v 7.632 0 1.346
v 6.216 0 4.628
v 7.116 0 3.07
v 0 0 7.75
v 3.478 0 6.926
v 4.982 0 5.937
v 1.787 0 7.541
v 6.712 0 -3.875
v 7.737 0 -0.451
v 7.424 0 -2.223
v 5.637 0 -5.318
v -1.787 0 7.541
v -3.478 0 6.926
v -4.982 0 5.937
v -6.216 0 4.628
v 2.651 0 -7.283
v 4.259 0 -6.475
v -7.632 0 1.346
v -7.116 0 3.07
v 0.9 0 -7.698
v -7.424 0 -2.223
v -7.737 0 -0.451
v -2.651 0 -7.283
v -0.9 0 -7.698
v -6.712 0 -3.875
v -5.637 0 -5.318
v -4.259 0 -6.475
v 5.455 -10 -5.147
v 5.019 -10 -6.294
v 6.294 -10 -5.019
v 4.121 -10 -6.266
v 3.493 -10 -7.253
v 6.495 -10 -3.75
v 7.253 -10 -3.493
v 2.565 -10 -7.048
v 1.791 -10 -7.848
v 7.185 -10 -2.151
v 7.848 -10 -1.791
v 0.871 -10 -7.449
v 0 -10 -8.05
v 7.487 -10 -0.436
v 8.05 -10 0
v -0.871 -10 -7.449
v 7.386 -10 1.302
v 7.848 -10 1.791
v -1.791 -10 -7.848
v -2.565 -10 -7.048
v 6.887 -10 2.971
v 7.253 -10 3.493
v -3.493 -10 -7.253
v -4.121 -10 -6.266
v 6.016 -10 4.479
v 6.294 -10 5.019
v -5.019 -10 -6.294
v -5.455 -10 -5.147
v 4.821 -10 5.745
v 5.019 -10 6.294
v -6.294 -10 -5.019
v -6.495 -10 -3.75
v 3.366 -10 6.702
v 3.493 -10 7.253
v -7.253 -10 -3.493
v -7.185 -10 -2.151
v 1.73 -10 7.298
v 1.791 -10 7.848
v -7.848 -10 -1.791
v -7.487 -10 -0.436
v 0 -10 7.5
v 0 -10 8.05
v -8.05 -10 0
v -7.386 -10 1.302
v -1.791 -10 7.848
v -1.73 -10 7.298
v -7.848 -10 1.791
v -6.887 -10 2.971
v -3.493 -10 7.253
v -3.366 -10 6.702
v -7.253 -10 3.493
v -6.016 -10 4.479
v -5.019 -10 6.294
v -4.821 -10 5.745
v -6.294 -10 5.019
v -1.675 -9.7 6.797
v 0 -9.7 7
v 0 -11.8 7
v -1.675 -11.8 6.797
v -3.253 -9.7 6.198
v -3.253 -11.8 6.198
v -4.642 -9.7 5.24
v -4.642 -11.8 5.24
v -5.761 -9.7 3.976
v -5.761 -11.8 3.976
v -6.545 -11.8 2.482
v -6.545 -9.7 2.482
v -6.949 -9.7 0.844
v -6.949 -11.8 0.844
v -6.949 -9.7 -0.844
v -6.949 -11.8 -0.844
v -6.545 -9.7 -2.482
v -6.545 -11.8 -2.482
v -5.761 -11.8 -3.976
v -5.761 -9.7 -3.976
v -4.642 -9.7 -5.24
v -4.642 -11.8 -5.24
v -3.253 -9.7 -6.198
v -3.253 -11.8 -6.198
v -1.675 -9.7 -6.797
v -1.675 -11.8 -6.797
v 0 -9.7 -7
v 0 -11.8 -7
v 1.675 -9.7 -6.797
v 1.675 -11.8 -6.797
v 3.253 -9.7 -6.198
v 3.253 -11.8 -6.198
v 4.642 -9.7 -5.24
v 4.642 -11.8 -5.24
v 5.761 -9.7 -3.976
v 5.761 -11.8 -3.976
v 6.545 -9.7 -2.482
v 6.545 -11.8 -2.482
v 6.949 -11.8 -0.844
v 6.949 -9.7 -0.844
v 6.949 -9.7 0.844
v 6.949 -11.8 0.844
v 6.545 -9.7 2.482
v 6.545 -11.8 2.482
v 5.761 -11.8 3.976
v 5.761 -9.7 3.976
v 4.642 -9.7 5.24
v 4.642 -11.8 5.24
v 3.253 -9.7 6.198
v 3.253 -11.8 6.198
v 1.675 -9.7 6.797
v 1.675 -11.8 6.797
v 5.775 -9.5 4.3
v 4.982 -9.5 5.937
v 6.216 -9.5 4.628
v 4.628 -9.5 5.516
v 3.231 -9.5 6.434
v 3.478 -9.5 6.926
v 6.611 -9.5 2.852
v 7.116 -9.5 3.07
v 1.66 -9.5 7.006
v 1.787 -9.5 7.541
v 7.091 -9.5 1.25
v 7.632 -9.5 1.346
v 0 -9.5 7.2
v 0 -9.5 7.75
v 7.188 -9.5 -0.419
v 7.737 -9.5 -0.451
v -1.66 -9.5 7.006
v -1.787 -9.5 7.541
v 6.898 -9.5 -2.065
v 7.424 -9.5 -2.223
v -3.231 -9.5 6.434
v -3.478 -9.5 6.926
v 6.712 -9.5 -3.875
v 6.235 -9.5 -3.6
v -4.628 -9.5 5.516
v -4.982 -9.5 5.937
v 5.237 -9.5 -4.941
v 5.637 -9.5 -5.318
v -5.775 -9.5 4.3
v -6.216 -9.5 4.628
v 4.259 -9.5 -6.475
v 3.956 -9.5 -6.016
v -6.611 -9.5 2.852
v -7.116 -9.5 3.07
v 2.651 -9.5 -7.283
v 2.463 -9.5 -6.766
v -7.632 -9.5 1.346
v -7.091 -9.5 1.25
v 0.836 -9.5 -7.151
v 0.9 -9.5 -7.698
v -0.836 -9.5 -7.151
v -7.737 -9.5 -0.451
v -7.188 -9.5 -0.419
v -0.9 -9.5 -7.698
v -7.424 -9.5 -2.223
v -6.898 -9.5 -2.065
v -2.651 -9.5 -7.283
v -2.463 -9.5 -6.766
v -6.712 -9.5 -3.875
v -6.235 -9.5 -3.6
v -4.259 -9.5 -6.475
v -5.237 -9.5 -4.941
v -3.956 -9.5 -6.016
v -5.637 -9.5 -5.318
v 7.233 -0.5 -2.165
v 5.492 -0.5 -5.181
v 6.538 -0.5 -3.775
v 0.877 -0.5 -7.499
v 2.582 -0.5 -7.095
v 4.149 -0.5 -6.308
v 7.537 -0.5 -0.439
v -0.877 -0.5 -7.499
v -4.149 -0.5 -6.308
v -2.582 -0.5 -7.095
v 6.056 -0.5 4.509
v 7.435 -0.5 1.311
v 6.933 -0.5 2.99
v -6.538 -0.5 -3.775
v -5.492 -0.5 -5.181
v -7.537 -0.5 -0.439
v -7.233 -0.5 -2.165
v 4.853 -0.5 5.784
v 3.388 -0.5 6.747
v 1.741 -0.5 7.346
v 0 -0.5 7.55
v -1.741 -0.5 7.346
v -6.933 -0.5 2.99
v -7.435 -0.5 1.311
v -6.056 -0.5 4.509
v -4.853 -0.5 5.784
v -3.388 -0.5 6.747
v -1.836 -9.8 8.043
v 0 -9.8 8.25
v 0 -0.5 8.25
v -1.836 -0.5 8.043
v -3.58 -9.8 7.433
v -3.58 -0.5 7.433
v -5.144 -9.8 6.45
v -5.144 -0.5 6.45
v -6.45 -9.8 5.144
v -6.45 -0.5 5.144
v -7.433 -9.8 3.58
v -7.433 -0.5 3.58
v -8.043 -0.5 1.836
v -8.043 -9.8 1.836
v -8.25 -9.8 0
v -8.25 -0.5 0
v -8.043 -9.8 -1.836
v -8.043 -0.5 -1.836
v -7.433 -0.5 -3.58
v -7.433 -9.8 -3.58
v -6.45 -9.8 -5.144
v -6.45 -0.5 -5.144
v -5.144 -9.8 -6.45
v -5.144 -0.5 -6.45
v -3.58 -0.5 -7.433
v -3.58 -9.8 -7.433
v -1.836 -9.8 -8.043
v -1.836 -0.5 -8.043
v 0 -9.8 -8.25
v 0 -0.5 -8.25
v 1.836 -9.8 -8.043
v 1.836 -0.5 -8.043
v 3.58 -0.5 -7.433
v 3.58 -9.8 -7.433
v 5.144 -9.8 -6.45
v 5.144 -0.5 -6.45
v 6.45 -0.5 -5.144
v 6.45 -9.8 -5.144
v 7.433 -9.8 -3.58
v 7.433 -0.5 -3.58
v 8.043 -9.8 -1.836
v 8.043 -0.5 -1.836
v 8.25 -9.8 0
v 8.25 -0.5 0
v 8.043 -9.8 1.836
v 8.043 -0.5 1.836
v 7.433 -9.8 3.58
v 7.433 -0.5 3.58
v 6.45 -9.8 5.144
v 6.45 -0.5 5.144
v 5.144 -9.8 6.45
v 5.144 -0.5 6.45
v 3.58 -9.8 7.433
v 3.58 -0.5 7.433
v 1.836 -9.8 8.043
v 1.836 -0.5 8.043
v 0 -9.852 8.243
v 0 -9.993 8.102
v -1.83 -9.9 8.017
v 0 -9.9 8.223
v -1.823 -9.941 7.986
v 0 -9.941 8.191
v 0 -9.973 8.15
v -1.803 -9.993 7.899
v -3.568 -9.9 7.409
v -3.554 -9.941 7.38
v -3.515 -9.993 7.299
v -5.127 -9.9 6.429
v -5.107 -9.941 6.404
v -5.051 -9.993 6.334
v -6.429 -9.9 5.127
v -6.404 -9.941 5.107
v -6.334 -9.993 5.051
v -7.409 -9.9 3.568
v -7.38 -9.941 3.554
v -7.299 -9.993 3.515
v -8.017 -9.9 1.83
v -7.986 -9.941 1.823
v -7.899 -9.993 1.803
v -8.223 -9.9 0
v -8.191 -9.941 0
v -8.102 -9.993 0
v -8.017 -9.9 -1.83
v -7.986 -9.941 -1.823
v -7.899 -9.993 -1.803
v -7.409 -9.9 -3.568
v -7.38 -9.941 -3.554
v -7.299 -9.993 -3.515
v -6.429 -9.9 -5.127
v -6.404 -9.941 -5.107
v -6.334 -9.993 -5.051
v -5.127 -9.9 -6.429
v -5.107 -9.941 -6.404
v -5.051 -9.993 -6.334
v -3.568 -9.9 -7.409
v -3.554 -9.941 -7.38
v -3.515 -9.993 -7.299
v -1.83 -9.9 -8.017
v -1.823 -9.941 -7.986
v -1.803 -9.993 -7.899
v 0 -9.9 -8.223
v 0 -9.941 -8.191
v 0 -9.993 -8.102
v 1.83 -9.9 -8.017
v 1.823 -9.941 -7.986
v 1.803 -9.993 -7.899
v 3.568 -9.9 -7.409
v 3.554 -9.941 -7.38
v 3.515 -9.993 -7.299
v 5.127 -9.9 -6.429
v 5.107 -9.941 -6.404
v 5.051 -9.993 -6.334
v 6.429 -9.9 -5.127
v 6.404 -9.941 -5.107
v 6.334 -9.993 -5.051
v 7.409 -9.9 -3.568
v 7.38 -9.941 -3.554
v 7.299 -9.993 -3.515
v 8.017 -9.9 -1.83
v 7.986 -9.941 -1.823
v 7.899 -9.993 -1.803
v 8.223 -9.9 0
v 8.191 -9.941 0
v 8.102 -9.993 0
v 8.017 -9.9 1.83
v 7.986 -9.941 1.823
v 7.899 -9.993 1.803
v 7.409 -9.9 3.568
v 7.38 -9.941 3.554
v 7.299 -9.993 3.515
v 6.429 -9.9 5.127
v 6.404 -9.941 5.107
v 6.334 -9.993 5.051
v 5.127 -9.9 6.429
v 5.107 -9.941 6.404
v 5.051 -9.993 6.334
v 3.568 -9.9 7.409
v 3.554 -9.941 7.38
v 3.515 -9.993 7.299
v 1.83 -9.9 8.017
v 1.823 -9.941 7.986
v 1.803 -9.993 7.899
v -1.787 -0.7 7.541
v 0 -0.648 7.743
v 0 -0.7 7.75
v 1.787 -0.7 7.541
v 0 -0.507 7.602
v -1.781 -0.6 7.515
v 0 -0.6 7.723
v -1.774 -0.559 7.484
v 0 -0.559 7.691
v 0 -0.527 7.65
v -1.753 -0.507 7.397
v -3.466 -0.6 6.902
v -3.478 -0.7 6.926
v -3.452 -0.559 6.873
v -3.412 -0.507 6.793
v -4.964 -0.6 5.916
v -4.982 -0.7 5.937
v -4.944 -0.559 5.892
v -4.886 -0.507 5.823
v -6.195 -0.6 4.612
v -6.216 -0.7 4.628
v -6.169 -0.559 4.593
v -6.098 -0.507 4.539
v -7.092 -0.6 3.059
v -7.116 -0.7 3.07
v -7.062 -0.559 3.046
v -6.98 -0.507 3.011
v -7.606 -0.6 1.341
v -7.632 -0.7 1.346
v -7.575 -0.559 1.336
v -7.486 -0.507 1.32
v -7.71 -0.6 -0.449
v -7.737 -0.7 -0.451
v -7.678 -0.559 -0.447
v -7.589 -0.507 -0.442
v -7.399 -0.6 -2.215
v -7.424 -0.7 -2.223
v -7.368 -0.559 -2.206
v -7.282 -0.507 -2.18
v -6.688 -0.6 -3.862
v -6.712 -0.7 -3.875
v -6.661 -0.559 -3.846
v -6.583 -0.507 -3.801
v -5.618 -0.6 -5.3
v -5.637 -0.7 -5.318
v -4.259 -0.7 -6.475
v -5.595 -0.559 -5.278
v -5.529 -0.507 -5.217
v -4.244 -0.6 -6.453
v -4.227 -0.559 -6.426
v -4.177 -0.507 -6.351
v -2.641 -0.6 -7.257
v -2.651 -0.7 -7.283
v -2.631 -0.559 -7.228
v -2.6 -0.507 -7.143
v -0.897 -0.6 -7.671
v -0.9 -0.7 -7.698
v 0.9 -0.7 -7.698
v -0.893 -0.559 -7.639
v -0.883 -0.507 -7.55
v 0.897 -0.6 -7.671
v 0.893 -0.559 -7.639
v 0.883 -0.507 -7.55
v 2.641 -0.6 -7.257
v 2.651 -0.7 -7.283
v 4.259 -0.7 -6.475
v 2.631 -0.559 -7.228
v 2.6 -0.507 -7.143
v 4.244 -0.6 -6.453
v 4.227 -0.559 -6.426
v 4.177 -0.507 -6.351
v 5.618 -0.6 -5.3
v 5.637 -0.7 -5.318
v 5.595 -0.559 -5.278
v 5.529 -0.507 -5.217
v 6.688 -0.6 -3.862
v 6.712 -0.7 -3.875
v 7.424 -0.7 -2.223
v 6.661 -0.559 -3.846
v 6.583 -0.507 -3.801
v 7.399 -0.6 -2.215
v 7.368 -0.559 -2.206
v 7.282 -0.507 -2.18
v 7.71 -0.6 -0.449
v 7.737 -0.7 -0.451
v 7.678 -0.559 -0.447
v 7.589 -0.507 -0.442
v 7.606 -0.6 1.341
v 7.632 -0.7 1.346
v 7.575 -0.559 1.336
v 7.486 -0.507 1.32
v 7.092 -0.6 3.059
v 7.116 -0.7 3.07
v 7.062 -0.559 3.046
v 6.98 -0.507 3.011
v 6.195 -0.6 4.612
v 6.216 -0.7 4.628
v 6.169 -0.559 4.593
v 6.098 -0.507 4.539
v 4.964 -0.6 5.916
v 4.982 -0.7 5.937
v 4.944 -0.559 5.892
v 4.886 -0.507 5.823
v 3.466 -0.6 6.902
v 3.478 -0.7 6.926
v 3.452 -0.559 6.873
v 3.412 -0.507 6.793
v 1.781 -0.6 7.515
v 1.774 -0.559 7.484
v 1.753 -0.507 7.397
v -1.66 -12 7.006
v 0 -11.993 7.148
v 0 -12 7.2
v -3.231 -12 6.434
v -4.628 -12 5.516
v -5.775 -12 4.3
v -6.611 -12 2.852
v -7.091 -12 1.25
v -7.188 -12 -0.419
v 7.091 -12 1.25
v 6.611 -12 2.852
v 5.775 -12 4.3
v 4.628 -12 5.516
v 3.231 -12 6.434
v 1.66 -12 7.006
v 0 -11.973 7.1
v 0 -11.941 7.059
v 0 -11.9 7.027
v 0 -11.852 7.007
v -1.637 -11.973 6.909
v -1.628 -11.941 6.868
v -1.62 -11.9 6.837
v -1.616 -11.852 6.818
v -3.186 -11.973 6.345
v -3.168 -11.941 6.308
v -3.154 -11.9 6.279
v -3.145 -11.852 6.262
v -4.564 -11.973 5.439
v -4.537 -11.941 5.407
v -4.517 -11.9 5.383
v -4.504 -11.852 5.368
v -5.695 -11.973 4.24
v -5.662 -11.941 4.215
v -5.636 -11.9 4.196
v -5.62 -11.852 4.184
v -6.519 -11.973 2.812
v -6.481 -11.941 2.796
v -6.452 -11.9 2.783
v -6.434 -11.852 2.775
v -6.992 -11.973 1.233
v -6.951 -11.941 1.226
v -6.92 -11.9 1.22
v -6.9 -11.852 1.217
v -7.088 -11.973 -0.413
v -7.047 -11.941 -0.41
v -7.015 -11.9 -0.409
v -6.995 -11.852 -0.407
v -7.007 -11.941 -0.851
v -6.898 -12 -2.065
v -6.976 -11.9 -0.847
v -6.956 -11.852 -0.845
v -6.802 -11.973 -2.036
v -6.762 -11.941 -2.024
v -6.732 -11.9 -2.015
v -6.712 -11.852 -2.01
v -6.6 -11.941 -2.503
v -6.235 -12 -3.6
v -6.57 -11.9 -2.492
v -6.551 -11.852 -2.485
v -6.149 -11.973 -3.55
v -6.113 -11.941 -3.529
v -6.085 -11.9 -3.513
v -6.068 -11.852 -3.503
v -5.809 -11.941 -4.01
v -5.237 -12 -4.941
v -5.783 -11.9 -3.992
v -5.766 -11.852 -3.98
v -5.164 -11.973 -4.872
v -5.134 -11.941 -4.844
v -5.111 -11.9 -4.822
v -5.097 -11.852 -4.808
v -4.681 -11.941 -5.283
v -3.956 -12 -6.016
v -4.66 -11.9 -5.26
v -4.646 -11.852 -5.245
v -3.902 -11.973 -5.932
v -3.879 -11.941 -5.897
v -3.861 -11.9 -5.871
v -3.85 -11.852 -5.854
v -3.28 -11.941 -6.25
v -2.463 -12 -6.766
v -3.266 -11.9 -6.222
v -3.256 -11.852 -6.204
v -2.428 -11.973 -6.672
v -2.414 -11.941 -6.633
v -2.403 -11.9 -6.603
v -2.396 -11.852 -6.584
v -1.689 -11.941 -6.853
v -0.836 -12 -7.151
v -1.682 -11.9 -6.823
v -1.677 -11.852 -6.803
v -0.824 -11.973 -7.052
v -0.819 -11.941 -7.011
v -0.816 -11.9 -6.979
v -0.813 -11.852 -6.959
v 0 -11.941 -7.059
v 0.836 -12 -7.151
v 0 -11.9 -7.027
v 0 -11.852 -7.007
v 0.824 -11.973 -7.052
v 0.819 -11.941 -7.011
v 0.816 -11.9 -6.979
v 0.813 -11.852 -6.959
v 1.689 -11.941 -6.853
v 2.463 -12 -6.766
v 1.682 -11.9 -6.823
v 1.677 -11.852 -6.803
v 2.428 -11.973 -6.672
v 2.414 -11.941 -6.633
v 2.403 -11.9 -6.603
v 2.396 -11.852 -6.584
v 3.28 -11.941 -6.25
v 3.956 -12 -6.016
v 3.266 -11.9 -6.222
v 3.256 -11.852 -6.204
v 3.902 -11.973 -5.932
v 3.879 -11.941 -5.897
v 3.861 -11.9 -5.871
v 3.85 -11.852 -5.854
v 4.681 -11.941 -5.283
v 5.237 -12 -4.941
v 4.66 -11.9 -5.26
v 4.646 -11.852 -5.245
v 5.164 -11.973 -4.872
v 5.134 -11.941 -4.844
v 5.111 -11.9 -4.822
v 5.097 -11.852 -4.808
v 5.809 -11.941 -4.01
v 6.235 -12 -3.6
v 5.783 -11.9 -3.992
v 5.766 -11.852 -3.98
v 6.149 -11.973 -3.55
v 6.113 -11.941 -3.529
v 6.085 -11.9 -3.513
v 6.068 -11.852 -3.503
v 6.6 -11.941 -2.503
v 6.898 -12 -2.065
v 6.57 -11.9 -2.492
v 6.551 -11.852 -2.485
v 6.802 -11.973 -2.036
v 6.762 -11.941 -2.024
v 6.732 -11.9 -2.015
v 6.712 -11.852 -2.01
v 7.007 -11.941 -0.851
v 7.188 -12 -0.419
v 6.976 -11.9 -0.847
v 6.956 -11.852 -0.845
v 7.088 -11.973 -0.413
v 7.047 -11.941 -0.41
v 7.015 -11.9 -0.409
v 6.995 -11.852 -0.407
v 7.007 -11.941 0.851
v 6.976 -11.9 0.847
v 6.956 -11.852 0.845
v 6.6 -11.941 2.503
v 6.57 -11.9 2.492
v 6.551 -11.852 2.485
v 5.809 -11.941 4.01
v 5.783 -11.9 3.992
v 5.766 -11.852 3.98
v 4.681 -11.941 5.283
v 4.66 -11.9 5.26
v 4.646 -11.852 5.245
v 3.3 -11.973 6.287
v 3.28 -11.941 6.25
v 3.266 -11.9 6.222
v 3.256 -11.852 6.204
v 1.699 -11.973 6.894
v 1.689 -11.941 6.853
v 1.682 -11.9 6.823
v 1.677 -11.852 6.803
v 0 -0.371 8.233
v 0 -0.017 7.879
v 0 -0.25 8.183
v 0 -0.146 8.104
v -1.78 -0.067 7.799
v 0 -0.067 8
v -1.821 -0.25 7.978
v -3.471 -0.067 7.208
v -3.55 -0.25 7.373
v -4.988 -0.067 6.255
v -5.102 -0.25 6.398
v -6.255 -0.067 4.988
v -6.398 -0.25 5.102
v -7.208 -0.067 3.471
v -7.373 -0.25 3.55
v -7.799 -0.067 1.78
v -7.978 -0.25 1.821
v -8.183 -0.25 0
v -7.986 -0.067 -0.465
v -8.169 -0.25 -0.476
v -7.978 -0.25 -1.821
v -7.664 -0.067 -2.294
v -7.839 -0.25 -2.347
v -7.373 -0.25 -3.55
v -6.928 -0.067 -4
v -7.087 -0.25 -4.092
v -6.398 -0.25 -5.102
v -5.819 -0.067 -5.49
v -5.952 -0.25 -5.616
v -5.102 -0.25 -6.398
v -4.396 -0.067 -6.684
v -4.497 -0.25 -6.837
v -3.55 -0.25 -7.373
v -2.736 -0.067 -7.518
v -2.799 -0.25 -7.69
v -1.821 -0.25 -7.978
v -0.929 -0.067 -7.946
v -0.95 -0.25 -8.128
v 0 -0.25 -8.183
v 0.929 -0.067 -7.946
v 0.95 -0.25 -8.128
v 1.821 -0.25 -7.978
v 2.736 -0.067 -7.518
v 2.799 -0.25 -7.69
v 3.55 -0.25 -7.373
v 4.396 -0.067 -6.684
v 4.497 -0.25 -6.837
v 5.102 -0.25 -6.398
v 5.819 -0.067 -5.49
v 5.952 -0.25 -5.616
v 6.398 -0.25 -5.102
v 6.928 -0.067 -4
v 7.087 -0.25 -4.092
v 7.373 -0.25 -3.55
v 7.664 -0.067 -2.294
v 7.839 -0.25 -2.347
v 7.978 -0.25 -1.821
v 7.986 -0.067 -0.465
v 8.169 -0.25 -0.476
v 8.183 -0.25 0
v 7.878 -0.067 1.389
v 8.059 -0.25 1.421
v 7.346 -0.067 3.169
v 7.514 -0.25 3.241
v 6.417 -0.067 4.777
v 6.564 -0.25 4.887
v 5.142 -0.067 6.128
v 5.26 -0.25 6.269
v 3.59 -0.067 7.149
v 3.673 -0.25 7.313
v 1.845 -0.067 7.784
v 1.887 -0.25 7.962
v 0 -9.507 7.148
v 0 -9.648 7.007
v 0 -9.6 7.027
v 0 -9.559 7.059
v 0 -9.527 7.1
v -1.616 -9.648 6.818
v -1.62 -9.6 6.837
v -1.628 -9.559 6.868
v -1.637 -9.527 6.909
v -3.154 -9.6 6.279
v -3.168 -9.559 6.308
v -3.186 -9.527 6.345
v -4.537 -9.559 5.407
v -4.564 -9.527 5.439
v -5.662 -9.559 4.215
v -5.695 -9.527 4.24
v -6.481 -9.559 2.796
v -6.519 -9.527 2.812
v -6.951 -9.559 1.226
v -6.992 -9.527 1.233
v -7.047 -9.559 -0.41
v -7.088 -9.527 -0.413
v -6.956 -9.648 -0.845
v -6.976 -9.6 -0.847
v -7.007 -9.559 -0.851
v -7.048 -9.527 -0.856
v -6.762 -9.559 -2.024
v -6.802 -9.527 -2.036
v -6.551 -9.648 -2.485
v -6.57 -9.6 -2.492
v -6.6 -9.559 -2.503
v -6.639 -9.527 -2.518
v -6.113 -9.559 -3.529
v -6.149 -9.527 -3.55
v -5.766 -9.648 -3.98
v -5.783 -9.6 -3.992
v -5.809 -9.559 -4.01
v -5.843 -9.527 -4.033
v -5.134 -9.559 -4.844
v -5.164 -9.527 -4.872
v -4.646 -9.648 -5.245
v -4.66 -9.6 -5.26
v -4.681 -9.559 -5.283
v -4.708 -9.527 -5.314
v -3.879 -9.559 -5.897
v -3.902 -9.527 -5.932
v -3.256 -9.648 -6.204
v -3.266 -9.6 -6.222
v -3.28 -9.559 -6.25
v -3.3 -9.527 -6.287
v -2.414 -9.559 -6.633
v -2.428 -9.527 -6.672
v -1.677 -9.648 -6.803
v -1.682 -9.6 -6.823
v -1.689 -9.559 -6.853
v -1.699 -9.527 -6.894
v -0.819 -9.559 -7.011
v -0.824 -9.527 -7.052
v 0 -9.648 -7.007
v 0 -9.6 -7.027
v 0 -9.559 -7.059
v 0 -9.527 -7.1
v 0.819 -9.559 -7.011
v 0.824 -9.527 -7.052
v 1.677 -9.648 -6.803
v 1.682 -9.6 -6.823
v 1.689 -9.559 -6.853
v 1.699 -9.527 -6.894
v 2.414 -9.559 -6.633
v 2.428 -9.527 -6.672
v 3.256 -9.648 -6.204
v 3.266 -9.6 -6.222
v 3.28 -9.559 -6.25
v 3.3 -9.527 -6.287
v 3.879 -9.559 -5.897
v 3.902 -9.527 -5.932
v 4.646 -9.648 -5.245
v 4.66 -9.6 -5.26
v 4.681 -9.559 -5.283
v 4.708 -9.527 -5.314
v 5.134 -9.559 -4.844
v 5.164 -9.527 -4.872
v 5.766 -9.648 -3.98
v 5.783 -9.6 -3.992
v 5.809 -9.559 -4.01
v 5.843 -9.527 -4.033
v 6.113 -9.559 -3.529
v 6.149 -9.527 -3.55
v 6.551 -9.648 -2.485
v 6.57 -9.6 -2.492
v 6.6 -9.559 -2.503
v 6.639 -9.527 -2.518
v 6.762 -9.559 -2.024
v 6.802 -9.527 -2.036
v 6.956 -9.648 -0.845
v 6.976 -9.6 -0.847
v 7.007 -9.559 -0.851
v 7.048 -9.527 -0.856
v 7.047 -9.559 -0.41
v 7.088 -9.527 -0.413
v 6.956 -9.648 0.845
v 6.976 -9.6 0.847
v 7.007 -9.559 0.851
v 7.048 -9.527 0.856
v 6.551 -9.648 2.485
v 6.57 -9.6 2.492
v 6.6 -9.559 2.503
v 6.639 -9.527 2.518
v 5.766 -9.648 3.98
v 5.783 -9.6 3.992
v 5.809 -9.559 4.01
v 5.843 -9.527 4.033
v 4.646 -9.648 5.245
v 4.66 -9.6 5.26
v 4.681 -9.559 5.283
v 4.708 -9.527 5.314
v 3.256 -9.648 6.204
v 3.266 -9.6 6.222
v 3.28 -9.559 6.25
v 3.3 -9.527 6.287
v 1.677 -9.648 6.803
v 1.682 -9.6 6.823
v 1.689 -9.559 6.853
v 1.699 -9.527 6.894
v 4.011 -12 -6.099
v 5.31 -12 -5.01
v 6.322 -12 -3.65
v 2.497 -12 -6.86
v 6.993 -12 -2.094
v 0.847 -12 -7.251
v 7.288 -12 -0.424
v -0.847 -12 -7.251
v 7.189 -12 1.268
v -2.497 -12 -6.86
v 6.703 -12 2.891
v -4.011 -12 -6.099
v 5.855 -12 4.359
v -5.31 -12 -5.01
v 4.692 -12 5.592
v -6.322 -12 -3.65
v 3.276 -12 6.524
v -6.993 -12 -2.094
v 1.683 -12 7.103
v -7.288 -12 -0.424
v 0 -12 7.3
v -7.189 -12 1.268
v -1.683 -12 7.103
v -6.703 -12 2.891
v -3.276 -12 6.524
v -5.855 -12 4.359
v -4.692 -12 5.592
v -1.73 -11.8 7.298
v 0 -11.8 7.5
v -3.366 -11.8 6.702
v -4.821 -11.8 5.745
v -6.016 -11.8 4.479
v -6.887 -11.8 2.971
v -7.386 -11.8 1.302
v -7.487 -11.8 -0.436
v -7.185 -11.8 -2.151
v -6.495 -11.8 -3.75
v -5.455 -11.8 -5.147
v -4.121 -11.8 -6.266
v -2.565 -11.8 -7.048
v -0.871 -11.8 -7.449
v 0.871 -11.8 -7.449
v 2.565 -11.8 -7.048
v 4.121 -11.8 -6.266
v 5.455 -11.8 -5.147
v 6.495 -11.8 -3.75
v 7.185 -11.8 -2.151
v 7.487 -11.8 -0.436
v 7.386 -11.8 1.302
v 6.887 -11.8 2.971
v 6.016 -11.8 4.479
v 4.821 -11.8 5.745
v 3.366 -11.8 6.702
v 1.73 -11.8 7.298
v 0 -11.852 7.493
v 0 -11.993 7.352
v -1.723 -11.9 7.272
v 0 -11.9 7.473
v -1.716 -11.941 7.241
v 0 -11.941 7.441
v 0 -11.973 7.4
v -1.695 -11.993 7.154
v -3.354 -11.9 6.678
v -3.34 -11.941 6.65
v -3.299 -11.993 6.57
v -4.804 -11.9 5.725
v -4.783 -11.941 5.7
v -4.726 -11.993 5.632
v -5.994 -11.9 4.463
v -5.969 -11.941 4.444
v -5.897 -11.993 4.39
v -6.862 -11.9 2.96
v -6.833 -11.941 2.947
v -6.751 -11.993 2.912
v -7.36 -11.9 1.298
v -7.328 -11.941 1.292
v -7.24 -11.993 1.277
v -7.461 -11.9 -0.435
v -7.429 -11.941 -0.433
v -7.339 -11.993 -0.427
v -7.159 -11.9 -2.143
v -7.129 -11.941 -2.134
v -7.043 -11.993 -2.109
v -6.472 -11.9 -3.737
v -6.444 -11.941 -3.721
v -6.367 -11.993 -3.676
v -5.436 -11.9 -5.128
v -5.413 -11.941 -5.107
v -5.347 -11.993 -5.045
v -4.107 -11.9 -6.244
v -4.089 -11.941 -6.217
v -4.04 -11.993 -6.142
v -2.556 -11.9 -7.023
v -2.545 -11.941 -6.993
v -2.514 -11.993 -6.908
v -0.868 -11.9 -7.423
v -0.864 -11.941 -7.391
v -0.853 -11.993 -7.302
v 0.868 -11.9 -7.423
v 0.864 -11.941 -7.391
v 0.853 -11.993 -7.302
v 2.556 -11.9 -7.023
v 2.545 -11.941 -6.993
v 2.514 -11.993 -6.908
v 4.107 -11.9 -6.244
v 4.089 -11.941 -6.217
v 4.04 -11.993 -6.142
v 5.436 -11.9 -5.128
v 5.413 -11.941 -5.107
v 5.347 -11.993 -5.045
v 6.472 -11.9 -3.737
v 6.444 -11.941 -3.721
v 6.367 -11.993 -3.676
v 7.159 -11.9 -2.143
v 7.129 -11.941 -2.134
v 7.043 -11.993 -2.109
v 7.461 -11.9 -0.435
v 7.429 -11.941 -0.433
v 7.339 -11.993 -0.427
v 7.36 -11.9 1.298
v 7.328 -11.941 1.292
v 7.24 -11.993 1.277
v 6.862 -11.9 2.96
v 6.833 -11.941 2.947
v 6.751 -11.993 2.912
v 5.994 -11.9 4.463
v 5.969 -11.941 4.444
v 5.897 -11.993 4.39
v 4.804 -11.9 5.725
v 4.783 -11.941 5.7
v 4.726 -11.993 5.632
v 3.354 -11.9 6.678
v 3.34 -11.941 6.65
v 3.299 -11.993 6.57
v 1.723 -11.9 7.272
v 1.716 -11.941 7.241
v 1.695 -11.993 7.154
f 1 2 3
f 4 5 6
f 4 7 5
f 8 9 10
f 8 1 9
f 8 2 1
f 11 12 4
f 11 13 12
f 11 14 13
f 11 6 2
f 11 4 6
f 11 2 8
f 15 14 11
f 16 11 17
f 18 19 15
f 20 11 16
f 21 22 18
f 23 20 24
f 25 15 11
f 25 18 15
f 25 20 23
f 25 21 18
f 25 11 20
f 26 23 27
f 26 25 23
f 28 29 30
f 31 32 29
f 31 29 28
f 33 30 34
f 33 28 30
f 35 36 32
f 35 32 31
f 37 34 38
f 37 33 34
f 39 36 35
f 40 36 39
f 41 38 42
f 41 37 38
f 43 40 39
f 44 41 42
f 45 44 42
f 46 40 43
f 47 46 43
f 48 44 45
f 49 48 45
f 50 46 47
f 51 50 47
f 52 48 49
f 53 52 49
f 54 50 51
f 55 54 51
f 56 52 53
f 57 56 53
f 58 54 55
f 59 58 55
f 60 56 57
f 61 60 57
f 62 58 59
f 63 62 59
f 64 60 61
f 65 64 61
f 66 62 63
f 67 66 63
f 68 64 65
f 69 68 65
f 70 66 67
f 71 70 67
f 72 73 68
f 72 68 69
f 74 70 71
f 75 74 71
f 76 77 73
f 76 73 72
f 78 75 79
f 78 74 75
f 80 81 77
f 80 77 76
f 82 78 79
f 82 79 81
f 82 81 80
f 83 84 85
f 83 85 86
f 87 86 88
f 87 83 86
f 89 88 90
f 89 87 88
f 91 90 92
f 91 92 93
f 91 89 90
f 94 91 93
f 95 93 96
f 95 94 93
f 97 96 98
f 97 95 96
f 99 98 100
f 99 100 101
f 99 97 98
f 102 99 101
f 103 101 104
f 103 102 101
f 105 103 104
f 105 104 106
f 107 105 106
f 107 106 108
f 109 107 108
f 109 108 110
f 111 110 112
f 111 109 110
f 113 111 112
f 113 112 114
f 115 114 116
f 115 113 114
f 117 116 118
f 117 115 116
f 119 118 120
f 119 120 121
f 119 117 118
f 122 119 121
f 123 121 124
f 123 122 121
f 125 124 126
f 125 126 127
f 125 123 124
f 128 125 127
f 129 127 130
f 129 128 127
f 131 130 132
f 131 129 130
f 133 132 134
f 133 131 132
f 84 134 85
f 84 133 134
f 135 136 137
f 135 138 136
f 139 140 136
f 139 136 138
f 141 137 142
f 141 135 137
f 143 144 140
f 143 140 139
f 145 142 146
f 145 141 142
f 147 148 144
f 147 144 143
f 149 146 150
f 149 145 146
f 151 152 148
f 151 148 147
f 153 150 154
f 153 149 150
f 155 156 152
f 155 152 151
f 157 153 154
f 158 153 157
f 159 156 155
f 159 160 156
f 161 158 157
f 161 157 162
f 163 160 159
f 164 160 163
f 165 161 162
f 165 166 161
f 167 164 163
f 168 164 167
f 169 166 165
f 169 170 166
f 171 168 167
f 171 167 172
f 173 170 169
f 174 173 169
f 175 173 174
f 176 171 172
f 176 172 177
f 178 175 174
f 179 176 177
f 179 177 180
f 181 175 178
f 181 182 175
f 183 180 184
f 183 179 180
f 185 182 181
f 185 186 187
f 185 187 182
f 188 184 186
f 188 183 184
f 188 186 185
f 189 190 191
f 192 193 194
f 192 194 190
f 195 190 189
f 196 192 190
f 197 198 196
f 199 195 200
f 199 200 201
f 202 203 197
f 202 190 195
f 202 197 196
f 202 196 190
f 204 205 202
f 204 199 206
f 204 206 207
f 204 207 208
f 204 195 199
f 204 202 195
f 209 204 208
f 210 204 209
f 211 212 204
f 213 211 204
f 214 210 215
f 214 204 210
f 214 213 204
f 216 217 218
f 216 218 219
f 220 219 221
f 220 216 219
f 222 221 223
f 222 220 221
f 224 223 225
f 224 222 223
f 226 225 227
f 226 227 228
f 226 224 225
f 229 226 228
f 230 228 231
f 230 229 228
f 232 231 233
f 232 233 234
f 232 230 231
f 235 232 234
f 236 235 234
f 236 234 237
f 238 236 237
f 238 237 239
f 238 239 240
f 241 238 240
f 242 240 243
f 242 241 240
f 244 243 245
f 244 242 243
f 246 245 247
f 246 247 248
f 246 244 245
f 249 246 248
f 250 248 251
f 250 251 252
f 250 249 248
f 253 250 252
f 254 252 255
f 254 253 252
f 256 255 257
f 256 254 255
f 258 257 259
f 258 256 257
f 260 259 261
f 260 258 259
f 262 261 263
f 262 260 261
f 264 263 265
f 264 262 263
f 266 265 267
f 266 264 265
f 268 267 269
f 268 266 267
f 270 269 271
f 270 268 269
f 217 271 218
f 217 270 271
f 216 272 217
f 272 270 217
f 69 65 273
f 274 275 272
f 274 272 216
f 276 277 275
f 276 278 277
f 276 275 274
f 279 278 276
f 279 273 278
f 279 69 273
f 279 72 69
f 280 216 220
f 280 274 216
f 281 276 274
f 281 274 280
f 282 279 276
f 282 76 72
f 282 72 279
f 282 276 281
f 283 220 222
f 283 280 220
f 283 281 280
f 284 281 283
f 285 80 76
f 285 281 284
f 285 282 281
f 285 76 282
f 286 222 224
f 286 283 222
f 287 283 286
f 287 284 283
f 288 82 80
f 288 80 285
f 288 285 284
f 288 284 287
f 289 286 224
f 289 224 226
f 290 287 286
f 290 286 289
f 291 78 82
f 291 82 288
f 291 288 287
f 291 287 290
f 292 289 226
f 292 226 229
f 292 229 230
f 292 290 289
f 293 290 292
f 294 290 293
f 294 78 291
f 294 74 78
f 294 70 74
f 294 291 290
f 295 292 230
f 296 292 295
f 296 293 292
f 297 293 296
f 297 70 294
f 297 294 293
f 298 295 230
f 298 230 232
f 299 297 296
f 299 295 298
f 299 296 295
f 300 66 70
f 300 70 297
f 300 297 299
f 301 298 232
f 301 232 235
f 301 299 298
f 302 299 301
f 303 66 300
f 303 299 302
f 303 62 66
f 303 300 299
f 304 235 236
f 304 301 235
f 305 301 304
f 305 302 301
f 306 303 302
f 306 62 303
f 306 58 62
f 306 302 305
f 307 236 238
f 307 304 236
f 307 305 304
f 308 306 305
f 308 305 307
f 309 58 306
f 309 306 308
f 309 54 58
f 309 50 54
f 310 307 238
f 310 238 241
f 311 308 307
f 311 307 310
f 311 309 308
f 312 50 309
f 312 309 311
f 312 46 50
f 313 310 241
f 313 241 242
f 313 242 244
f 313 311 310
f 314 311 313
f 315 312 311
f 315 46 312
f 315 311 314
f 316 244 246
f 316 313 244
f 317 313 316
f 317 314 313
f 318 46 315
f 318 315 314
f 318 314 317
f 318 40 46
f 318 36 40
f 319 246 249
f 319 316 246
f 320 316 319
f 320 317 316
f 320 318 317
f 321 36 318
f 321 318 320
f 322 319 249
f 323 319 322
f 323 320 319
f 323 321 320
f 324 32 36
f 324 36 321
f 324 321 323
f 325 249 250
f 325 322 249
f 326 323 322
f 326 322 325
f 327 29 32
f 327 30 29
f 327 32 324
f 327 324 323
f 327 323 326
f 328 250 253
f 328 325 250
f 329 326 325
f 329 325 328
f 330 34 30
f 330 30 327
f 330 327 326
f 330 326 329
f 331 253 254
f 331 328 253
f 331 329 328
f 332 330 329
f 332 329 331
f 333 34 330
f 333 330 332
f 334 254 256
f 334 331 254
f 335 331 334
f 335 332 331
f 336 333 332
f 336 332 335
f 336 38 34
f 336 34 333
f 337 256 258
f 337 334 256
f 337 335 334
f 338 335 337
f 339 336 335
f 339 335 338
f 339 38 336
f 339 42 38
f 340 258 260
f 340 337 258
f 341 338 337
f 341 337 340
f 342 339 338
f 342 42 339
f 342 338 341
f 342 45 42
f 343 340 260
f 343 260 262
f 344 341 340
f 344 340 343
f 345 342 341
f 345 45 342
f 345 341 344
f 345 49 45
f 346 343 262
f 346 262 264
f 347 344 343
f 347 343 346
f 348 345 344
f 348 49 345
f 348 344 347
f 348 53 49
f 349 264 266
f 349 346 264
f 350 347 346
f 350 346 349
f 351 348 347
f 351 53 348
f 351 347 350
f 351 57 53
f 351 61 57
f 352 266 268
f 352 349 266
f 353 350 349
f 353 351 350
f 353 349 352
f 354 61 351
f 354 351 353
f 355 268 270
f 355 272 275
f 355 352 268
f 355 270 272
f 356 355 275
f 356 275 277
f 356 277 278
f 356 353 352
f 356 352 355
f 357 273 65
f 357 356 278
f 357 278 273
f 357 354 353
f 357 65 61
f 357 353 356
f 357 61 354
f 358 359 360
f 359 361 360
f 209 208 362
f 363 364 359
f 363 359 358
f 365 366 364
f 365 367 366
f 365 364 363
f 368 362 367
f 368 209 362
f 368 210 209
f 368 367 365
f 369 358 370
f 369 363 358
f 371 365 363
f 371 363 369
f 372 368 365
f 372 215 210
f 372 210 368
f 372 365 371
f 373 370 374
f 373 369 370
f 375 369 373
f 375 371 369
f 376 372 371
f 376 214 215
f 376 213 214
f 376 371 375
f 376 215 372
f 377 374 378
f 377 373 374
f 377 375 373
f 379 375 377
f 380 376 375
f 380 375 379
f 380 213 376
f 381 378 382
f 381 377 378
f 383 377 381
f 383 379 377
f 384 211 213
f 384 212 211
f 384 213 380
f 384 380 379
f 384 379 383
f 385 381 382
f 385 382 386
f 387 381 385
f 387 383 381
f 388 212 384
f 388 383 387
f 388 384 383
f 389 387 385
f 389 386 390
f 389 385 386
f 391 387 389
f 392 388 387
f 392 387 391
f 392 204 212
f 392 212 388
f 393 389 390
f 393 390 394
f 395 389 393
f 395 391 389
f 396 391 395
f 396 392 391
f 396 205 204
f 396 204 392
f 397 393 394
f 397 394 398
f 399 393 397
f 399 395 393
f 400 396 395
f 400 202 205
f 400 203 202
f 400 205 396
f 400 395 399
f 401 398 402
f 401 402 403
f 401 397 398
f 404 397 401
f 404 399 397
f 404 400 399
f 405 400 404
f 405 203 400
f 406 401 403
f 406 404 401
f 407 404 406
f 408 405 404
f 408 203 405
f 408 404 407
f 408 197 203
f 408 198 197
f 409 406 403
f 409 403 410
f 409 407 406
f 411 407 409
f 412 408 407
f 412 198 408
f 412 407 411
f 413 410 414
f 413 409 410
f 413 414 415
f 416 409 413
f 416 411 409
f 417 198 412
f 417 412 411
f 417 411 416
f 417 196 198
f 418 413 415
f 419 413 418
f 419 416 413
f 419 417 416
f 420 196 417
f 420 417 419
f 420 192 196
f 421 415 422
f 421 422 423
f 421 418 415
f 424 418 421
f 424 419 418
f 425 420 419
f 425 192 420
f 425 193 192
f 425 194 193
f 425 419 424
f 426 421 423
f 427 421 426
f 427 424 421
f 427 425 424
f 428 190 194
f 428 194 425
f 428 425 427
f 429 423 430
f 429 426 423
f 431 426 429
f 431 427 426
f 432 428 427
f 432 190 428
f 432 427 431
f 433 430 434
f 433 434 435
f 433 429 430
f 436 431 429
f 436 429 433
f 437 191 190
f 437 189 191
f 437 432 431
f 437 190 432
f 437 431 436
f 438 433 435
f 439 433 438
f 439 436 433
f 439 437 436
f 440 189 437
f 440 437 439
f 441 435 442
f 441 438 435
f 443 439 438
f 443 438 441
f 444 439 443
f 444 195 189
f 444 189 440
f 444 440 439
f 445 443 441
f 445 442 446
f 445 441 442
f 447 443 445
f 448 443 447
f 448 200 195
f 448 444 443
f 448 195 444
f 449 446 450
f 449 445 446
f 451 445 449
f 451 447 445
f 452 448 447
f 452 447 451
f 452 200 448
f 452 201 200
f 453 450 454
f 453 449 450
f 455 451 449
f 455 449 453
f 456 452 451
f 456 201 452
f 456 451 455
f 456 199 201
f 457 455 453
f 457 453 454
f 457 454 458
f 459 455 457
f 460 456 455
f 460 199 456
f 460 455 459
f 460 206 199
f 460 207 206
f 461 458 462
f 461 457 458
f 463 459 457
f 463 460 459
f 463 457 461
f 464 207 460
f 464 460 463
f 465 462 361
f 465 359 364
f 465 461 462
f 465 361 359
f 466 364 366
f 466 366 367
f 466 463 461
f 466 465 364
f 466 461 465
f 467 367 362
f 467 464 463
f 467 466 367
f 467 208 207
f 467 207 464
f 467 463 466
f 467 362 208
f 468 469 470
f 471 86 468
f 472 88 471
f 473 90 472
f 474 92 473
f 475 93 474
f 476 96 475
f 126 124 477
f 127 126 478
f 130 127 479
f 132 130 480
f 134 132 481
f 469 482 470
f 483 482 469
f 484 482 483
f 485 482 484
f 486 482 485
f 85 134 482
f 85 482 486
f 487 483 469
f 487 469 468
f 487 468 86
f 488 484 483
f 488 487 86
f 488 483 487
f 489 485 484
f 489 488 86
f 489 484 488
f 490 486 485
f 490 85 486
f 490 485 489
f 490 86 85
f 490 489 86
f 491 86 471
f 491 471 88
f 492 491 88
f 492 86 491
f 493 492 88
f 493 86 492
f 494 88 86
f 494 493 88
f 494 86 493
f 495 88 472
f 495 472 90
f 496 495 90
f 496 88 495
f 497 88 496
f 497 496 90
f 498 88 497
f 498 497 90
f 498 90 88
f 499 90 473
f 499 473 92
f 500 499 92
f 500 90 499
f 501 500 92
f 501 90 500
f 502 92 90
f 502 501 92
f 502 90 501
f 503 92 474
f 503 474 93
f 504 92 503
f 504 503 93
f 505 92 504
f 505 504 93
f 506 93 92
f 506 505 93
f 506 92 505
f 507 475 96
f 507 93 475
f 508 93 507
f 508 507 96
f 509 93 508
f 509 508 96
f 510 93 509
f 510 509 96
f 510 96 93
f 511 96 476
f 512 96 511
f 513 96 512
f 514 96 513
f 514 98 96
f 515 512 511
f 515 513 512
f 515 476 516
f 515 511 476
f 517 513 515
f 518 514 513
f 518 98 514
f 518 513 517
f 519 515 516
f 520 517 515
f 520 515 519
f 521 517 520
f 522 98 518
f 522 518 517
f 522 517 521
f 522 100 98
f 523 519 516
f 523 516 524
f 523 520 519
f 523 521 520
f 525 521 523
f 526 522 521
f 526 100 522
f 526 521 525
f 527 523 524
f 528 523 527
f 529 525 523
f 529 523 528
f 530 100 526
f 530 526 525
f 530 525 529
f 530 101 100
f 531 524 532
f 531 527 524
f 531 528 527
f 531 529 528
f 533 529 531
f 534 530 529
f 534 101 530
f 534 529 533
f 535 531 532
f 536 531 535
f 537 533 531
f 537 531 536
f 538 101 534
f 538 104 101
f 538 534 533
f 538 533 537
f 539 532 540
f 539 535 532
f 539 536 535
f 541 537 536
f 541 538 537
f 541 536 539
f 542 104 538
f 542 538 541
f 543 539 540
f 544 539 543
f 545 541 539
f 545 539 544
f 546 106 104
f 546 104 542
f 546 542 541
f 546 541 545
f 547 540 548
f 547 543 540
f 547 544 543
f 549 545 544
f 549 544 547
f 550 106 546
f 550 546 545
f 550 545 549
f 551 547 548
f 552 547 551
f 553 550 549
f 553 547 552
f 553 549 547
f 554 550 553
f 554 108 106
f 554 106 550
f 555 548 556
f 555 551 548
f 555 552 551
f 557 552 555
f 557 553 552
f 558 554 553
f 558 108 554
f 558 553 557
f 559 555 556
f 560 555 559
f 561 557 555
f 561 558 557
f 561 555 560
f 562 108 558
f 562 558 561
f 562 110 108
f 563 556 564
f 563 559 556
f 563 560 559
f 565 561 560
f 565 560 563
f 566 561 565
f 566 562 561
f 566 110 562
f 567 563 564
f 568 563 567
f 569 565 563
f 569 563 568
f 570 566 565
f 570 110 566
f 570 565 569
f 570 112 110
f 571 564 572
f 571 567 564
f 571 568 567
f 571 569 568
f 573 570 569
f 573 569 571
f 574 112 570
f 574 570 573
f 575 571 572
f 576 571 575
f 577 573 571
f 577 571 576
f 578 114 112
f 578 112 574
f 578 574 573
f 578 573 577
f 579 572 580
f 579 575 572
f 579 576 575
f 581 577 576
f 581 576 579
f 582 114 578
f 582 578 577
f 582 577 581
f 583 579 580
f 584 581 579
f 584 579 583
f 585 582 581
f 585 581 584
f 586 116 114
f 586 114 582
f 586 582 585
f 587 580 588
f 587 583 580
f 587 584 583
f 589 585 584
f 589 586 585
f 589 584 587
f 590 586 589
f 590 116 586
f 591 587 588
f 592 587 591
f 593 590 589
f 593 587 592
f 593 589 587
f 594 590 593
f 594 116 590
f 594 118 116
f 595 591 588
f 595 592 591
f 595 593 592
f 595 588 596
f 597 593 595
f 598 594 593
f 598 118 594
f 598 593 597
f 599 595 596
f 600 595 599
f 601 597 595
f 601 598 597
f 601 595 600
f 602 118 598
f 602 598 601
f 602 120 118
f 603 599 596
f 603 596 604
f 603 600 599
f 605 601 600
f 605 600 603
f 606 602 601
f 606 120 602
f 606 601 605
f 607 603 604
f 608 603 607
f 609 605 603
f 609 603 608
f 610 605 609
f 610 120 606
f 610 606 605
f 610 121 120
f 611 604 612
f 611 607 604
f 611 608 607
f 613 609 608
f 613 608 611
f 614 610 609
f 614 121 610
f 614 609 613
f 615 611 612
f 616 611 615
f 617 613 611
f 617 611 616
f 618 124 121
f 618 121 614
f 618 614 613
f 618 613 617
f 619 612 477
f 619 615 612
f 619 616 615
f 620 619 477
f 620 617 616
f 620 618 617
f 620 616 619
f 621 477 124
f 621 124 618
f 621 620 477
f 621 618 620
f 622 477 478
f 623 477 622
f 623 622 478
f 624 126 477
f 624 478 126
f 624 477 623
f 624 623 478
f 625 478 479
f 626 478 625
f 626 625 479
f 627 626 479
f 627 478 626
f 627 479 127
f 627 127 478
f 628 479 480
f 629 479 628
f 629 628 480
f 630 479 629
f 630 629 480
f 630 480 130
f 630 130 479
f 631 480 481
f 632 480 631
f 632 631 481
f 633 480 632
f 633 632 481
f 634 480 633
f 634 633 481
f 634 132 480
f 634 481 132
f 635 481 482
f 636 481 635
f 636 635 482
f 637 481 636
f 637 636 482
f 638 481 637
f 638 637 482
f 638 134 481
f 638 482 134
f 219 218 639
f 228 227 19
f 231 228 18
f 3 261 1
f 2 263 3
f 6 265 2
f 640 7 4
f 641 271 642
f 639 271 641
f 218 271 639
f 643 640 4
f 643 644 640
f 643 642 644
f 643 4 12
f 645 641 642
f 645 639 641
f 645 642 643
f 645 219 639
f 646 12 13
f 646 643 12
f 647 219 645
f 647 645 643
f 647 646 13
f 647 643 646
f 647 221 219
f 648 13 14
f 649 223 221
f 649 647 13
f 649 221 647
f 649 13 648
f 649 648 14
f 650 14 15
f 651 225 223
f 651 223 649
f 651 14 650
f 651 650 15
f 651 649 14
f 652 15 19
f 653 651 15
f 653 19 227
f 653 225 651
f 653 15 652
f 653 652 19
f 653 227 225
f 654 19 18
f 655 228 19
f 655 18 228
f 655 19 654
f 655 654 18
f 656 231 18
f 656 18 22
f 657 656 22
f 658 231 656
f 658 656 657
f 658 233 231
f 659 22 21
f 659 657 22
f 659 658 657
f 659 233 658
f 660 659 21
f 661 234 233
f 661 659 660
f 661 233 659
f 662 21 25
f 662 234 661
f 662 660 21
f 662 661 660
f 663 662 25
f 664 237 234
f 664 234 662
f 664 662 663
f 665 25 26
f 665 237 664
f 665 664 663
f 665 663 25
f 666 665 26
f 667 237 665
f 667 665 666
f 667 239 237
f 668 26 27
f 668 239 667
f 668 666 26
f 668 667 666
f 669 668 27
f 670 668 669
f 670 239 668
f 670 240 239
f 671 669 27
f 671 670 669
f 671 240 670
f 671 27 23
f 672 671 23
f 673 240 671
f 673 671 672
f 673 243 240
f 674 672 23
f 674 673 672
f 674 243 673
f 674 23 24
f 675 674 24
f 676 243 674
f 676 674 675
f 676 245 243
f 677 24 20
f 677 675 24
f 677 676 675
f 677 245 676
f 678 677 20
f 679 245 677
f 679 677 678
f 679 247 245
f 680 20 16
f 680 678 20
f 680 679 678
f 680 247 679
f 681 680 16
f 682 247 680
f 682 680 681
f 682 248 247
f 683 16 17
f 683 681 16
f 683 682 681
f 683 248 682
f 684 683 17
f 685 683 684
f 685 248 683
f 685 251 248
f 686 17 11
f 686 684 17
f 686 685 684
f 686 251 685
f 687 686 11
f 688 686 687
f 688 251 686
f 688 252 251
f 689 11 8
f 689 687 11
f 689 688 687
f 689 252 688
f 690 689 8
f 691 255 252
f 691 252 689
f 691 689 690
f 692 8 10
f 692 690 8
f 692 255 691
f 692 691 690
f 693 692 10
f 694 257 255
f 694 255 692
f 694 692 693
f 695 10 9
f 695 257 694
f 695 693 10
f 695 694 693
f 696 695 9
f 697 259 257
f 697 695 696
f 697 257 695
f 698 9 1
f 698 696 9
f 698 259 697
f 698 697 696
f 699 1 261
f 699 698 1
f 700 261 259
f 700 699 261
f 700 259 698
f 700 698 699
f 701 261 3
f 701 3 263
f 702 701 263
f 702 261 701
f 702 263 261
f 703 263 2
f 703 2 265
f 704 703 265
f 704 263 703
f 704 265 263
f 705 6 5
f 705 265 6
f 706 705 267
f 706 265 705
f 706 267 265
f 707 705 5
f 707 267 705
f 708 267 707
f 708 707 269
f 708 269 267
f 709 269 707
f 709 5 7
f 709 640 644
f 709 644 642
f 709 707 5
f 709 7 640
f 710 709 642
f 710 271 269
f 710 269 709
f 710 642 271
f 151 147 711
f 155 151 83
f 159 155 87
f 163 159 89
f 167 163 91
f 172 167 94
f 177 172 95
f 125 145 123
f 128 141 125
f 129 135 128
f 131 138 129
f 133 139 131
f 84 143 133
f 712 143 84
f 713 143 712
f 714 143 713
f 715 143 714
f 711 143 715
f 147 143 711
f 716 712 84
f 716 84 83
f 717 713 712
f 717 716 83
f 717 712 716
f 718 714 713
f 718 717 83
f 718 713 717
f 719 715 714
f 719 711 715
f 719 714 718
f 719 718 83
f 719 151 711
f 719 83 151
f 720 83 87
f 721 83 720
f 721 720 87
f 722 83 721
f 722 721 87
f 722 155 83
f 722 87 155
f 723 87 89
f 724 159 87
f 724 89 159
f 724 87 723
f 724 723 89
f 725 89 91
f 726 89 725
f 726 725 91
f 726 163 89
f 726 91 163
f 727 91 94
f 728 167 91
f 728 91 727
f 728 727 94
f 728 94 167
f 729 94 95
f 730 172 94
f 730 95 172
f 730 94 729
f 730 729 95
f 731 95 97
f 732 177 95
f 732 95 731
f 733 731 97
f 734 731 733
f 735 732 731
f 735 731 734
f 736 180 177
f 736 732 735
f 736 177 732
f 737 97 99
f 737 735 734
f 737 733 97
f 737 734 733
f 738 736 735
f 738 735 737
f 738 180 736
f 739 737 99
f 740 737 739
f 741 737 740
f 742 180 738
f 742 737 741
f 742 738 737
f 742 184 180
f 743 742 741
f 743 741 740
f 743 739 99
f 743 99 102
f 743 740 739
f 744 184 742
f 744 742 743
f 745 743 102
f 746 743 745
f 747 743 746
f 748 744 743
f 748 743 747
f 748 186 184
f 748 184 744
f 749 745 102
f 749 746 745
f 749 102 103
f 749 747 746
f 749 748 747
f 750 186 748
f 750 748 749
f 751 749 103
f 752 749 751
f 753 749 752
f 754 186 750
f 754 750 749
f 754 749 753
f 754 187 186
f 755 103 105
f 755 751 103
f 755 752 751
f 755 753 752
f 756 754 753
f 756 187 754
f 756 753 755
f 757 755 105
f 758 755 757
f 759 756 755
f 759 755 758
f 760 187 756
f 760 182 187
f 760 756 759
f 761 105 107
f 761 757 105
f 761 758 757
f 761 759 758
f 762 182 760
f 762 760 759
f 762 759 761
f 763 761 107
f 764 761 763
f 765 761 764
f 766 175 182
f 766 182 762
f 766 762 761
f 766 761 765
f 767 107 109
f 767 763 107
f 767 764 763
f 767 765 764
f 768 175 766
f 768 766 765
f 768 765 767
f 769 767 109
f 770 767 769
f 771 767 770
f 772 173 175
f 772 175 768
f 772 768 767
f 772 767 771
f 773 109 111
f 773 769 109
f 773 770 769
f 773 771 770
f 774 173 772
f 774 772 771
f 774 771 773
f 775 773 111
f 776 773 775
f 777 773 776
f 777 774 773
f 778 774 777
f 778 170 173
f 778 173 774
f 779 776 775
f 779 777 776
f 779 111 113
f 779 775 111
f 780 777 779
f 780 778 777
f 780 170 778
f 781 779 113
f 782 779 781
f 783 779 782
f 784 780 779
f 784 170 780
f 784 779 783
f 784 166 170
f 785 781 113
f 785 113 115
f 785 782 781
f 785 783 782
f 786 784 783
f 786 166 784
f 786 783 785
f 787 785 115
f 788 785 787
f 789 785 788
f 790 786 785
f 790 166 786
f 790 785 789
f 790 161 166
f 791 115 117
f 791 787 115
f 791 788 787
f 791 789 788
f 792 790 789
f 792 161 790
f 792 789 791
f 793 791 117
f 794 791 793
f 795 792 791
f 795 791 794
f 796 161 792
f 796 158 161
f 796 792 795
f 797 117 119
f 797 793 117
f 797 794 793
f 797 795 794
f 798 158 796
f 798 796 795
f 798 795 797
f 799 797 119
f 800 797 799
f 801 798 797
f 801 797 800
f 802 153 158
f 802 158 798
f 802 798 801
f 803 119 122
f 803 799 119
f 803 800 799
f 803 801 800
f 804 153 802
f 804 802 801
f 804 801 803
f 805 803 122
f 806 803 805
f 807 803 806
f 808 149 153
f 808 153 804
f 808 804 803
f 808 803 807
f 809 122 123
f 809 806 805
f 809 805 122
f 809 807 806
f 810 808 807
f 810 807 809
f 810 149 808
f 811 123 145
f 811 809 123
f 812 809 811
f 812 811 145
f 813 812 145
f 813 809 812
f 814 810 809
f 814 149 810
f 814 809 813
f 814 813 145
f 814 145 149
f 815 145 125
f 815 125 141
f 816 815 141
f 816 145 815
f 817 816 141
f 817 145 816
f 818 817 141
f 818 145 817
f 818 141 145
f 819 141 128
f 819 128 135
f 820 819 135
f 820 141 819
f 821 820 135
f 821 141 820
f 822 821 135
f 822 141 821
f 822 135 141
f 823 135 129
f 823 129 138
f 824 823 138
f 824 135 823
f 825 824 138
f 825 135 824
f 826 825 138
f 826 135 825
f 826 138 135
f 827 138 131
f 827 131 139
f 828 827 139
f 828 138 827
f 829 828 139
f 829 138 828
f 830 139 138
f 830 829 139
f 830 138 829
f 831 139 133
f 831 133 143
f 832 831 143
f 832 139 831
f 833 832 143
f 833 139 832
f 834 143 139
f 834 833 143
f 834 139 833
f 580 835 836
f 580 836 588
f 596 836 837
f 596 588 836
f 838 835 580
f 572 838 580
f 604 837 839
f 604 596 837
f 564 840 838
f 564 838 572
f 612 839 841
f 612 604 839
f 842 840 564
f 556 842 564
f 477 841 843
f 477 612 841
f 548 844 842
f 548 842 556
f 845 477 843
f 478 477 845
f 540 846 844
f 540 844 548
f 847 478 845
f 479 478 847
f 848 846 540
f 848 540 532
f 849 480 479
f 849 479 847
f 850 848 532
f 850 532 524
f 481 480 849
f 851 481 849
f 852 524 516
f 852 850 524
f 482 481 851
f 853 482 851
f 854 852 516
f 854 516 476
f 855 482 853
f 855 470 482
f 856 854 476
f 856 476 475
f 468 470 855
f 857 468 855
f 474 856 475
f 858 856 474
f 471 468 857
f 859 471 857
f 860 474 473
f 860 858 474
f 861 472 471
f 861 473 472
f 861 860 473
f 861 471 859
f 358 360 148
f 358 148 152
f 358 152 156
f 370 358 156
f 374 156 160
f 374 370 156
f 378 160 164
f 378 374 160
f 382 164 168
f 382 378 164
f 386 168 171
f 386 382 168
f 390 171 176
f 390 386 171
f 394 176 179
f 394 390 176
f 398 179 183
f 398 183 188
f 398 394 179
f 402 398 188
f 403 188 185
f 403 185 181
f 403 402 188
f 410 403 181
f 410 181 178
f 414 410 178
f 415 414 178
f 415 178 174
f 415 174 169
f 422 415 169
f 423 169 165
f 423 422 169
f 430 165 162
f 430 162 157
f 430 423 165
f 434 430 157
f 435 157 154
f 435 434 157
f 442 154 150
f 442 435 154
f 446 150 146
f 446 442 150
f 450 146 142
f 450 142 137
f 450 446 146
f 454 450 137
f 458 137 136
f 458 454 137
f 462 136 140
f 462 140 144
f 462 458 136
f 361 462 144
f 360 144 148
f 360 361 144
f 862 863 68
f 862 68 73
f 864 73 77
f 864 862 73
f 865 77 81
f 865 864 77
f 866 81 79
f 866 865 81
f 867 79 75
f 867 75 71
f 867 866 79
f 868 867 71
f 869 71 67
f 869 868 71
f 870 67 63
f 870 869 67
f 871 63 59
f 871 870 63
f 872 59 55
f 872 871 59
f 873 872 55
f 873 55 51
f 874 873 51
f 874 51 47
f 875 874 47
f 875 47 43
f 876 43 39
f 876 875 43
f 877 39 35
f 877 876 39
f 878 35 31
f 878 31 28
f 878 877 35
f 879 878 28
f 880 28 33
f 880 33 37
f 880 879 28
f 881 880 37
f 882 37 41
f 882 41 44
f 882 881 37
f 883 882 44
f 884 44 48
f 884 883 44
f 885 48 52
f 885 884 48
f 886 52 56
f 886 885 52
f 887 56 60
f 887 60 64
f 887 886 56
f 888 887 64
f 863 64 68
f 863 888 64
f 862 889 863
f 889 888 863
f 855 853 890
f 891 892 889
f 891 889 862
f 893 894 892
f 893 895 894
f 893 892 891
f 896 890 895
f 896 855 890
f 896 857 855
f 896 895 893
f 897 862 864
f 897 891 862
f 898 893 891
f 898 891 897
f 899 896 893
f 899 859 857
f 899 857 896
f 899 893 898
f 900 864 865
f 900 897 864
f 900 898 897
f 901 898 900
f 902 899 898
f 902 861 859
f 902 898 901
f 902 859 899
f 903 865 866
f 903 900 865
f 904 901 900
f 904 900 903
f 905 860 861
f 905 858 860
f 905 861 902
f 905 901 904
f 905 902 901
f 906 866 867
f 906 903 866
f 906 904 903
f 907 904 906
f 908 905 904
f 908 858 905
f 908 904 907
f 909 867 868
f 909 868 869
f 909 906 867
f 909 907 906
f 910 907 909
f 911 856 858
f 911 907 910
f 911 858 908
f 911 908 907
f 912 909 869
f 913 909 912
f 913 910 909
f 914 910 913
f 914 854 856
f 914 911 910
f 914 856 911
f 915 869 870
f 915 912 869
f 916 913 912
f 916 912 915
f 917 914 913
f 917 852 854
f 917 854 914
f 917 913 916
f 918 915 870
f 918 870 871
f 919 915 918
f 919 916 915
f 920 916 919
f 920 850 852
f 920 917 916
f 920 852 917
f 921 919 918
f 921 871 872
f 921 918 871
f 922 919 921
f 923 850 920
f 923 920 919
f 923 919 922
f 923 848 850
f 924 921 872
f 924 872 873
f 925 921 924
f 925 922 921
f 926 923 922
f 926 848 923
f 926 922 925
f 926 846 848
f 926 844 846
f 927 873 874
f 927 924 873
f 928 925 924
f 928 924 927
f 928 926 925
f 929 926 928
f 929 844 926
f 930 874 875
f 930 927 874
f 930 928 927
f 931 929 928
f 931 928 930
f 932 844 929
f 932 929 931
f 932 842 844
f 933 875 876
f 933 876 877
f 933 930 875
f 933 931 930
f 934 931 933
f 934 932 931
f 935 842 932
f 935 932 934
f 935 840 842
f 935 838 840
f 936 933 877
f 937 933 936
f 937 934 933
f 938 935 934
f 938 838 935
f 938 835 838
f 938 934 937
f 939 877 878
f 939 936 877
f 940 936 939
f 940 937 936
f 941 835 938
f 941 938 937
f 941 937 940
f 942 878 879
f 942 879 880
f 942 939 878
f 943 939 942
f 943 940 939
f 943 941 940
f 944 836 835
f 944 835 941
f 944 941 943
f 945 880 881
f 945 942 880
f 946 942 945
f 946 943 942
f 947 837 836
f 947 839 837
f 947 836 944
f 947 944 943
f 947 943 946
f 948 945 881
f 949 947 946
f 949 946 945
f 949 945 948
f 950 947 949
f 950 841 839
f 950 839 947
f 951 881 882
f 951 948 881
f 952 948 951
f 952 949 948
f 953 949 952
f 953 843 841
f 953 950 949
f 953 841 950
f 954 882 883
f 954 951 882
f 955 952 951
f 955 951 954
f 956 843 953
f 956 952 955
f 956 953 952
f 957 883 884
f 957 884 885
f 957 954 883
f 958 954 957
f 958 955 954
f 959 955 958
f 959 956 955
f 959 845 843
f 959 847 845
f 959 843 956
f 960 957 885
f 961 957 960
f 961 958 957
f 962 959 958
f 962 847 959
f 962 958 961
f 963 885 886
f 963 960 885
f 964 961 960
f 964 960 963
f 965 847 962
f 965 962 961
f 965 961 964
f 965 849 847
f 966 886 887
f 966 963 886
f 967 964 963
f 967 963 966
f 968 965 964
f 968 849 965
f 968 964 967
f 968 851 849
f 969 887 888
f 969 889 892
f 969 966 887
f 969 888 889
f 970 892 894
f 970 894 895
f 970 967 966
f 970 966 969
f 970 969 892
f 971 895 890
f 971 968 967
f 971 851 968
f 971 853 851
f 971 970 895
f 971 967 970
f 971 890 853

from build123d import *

# Parameters (mm, degrees)
FILLET1_R = 0.5
FILLET2_R = 0.2


with BuildPart() as part:
    # Sketch1 → Revolve1 (revolve)
    with BuildSketch(Plane(origin=(0, 0, 0), x_dir=(0, 0, -1), z_dir=(1, 0, 0))):
        Polygon((0, 0), (-8.25, 0), (-8.25, -10), (-7.5, -10), (-7.5, -12), (-7, -12), (-7, -9.5), (-7.75, -9.5), (-7.75, -0.5), (0, -0.5), align=None)
    revolve(axis=Axis((0, 0, 0), (0, -1, 0)))

    # Fillet1
    fillet1_edges = [part.edges().sort_by_distance(p)[0] for p in [
        (0, 0, -8.25),
    ]]
    fillet(fillet1_edges, radius=FILLET1_R)

    # Fillet2
    fillet2_edges = [part.edges().sort_by_distance(p)[0] for p in [
        (0, -0.5, -7.75),
        (0, -10, -8.25),
        (0, -12, -7.5),
        (0, -12, -7),
        (0, -9.5, -7),
    ]]
    fillet(fillet2_edges, radius=FILLET2_R)


solid = part.part
